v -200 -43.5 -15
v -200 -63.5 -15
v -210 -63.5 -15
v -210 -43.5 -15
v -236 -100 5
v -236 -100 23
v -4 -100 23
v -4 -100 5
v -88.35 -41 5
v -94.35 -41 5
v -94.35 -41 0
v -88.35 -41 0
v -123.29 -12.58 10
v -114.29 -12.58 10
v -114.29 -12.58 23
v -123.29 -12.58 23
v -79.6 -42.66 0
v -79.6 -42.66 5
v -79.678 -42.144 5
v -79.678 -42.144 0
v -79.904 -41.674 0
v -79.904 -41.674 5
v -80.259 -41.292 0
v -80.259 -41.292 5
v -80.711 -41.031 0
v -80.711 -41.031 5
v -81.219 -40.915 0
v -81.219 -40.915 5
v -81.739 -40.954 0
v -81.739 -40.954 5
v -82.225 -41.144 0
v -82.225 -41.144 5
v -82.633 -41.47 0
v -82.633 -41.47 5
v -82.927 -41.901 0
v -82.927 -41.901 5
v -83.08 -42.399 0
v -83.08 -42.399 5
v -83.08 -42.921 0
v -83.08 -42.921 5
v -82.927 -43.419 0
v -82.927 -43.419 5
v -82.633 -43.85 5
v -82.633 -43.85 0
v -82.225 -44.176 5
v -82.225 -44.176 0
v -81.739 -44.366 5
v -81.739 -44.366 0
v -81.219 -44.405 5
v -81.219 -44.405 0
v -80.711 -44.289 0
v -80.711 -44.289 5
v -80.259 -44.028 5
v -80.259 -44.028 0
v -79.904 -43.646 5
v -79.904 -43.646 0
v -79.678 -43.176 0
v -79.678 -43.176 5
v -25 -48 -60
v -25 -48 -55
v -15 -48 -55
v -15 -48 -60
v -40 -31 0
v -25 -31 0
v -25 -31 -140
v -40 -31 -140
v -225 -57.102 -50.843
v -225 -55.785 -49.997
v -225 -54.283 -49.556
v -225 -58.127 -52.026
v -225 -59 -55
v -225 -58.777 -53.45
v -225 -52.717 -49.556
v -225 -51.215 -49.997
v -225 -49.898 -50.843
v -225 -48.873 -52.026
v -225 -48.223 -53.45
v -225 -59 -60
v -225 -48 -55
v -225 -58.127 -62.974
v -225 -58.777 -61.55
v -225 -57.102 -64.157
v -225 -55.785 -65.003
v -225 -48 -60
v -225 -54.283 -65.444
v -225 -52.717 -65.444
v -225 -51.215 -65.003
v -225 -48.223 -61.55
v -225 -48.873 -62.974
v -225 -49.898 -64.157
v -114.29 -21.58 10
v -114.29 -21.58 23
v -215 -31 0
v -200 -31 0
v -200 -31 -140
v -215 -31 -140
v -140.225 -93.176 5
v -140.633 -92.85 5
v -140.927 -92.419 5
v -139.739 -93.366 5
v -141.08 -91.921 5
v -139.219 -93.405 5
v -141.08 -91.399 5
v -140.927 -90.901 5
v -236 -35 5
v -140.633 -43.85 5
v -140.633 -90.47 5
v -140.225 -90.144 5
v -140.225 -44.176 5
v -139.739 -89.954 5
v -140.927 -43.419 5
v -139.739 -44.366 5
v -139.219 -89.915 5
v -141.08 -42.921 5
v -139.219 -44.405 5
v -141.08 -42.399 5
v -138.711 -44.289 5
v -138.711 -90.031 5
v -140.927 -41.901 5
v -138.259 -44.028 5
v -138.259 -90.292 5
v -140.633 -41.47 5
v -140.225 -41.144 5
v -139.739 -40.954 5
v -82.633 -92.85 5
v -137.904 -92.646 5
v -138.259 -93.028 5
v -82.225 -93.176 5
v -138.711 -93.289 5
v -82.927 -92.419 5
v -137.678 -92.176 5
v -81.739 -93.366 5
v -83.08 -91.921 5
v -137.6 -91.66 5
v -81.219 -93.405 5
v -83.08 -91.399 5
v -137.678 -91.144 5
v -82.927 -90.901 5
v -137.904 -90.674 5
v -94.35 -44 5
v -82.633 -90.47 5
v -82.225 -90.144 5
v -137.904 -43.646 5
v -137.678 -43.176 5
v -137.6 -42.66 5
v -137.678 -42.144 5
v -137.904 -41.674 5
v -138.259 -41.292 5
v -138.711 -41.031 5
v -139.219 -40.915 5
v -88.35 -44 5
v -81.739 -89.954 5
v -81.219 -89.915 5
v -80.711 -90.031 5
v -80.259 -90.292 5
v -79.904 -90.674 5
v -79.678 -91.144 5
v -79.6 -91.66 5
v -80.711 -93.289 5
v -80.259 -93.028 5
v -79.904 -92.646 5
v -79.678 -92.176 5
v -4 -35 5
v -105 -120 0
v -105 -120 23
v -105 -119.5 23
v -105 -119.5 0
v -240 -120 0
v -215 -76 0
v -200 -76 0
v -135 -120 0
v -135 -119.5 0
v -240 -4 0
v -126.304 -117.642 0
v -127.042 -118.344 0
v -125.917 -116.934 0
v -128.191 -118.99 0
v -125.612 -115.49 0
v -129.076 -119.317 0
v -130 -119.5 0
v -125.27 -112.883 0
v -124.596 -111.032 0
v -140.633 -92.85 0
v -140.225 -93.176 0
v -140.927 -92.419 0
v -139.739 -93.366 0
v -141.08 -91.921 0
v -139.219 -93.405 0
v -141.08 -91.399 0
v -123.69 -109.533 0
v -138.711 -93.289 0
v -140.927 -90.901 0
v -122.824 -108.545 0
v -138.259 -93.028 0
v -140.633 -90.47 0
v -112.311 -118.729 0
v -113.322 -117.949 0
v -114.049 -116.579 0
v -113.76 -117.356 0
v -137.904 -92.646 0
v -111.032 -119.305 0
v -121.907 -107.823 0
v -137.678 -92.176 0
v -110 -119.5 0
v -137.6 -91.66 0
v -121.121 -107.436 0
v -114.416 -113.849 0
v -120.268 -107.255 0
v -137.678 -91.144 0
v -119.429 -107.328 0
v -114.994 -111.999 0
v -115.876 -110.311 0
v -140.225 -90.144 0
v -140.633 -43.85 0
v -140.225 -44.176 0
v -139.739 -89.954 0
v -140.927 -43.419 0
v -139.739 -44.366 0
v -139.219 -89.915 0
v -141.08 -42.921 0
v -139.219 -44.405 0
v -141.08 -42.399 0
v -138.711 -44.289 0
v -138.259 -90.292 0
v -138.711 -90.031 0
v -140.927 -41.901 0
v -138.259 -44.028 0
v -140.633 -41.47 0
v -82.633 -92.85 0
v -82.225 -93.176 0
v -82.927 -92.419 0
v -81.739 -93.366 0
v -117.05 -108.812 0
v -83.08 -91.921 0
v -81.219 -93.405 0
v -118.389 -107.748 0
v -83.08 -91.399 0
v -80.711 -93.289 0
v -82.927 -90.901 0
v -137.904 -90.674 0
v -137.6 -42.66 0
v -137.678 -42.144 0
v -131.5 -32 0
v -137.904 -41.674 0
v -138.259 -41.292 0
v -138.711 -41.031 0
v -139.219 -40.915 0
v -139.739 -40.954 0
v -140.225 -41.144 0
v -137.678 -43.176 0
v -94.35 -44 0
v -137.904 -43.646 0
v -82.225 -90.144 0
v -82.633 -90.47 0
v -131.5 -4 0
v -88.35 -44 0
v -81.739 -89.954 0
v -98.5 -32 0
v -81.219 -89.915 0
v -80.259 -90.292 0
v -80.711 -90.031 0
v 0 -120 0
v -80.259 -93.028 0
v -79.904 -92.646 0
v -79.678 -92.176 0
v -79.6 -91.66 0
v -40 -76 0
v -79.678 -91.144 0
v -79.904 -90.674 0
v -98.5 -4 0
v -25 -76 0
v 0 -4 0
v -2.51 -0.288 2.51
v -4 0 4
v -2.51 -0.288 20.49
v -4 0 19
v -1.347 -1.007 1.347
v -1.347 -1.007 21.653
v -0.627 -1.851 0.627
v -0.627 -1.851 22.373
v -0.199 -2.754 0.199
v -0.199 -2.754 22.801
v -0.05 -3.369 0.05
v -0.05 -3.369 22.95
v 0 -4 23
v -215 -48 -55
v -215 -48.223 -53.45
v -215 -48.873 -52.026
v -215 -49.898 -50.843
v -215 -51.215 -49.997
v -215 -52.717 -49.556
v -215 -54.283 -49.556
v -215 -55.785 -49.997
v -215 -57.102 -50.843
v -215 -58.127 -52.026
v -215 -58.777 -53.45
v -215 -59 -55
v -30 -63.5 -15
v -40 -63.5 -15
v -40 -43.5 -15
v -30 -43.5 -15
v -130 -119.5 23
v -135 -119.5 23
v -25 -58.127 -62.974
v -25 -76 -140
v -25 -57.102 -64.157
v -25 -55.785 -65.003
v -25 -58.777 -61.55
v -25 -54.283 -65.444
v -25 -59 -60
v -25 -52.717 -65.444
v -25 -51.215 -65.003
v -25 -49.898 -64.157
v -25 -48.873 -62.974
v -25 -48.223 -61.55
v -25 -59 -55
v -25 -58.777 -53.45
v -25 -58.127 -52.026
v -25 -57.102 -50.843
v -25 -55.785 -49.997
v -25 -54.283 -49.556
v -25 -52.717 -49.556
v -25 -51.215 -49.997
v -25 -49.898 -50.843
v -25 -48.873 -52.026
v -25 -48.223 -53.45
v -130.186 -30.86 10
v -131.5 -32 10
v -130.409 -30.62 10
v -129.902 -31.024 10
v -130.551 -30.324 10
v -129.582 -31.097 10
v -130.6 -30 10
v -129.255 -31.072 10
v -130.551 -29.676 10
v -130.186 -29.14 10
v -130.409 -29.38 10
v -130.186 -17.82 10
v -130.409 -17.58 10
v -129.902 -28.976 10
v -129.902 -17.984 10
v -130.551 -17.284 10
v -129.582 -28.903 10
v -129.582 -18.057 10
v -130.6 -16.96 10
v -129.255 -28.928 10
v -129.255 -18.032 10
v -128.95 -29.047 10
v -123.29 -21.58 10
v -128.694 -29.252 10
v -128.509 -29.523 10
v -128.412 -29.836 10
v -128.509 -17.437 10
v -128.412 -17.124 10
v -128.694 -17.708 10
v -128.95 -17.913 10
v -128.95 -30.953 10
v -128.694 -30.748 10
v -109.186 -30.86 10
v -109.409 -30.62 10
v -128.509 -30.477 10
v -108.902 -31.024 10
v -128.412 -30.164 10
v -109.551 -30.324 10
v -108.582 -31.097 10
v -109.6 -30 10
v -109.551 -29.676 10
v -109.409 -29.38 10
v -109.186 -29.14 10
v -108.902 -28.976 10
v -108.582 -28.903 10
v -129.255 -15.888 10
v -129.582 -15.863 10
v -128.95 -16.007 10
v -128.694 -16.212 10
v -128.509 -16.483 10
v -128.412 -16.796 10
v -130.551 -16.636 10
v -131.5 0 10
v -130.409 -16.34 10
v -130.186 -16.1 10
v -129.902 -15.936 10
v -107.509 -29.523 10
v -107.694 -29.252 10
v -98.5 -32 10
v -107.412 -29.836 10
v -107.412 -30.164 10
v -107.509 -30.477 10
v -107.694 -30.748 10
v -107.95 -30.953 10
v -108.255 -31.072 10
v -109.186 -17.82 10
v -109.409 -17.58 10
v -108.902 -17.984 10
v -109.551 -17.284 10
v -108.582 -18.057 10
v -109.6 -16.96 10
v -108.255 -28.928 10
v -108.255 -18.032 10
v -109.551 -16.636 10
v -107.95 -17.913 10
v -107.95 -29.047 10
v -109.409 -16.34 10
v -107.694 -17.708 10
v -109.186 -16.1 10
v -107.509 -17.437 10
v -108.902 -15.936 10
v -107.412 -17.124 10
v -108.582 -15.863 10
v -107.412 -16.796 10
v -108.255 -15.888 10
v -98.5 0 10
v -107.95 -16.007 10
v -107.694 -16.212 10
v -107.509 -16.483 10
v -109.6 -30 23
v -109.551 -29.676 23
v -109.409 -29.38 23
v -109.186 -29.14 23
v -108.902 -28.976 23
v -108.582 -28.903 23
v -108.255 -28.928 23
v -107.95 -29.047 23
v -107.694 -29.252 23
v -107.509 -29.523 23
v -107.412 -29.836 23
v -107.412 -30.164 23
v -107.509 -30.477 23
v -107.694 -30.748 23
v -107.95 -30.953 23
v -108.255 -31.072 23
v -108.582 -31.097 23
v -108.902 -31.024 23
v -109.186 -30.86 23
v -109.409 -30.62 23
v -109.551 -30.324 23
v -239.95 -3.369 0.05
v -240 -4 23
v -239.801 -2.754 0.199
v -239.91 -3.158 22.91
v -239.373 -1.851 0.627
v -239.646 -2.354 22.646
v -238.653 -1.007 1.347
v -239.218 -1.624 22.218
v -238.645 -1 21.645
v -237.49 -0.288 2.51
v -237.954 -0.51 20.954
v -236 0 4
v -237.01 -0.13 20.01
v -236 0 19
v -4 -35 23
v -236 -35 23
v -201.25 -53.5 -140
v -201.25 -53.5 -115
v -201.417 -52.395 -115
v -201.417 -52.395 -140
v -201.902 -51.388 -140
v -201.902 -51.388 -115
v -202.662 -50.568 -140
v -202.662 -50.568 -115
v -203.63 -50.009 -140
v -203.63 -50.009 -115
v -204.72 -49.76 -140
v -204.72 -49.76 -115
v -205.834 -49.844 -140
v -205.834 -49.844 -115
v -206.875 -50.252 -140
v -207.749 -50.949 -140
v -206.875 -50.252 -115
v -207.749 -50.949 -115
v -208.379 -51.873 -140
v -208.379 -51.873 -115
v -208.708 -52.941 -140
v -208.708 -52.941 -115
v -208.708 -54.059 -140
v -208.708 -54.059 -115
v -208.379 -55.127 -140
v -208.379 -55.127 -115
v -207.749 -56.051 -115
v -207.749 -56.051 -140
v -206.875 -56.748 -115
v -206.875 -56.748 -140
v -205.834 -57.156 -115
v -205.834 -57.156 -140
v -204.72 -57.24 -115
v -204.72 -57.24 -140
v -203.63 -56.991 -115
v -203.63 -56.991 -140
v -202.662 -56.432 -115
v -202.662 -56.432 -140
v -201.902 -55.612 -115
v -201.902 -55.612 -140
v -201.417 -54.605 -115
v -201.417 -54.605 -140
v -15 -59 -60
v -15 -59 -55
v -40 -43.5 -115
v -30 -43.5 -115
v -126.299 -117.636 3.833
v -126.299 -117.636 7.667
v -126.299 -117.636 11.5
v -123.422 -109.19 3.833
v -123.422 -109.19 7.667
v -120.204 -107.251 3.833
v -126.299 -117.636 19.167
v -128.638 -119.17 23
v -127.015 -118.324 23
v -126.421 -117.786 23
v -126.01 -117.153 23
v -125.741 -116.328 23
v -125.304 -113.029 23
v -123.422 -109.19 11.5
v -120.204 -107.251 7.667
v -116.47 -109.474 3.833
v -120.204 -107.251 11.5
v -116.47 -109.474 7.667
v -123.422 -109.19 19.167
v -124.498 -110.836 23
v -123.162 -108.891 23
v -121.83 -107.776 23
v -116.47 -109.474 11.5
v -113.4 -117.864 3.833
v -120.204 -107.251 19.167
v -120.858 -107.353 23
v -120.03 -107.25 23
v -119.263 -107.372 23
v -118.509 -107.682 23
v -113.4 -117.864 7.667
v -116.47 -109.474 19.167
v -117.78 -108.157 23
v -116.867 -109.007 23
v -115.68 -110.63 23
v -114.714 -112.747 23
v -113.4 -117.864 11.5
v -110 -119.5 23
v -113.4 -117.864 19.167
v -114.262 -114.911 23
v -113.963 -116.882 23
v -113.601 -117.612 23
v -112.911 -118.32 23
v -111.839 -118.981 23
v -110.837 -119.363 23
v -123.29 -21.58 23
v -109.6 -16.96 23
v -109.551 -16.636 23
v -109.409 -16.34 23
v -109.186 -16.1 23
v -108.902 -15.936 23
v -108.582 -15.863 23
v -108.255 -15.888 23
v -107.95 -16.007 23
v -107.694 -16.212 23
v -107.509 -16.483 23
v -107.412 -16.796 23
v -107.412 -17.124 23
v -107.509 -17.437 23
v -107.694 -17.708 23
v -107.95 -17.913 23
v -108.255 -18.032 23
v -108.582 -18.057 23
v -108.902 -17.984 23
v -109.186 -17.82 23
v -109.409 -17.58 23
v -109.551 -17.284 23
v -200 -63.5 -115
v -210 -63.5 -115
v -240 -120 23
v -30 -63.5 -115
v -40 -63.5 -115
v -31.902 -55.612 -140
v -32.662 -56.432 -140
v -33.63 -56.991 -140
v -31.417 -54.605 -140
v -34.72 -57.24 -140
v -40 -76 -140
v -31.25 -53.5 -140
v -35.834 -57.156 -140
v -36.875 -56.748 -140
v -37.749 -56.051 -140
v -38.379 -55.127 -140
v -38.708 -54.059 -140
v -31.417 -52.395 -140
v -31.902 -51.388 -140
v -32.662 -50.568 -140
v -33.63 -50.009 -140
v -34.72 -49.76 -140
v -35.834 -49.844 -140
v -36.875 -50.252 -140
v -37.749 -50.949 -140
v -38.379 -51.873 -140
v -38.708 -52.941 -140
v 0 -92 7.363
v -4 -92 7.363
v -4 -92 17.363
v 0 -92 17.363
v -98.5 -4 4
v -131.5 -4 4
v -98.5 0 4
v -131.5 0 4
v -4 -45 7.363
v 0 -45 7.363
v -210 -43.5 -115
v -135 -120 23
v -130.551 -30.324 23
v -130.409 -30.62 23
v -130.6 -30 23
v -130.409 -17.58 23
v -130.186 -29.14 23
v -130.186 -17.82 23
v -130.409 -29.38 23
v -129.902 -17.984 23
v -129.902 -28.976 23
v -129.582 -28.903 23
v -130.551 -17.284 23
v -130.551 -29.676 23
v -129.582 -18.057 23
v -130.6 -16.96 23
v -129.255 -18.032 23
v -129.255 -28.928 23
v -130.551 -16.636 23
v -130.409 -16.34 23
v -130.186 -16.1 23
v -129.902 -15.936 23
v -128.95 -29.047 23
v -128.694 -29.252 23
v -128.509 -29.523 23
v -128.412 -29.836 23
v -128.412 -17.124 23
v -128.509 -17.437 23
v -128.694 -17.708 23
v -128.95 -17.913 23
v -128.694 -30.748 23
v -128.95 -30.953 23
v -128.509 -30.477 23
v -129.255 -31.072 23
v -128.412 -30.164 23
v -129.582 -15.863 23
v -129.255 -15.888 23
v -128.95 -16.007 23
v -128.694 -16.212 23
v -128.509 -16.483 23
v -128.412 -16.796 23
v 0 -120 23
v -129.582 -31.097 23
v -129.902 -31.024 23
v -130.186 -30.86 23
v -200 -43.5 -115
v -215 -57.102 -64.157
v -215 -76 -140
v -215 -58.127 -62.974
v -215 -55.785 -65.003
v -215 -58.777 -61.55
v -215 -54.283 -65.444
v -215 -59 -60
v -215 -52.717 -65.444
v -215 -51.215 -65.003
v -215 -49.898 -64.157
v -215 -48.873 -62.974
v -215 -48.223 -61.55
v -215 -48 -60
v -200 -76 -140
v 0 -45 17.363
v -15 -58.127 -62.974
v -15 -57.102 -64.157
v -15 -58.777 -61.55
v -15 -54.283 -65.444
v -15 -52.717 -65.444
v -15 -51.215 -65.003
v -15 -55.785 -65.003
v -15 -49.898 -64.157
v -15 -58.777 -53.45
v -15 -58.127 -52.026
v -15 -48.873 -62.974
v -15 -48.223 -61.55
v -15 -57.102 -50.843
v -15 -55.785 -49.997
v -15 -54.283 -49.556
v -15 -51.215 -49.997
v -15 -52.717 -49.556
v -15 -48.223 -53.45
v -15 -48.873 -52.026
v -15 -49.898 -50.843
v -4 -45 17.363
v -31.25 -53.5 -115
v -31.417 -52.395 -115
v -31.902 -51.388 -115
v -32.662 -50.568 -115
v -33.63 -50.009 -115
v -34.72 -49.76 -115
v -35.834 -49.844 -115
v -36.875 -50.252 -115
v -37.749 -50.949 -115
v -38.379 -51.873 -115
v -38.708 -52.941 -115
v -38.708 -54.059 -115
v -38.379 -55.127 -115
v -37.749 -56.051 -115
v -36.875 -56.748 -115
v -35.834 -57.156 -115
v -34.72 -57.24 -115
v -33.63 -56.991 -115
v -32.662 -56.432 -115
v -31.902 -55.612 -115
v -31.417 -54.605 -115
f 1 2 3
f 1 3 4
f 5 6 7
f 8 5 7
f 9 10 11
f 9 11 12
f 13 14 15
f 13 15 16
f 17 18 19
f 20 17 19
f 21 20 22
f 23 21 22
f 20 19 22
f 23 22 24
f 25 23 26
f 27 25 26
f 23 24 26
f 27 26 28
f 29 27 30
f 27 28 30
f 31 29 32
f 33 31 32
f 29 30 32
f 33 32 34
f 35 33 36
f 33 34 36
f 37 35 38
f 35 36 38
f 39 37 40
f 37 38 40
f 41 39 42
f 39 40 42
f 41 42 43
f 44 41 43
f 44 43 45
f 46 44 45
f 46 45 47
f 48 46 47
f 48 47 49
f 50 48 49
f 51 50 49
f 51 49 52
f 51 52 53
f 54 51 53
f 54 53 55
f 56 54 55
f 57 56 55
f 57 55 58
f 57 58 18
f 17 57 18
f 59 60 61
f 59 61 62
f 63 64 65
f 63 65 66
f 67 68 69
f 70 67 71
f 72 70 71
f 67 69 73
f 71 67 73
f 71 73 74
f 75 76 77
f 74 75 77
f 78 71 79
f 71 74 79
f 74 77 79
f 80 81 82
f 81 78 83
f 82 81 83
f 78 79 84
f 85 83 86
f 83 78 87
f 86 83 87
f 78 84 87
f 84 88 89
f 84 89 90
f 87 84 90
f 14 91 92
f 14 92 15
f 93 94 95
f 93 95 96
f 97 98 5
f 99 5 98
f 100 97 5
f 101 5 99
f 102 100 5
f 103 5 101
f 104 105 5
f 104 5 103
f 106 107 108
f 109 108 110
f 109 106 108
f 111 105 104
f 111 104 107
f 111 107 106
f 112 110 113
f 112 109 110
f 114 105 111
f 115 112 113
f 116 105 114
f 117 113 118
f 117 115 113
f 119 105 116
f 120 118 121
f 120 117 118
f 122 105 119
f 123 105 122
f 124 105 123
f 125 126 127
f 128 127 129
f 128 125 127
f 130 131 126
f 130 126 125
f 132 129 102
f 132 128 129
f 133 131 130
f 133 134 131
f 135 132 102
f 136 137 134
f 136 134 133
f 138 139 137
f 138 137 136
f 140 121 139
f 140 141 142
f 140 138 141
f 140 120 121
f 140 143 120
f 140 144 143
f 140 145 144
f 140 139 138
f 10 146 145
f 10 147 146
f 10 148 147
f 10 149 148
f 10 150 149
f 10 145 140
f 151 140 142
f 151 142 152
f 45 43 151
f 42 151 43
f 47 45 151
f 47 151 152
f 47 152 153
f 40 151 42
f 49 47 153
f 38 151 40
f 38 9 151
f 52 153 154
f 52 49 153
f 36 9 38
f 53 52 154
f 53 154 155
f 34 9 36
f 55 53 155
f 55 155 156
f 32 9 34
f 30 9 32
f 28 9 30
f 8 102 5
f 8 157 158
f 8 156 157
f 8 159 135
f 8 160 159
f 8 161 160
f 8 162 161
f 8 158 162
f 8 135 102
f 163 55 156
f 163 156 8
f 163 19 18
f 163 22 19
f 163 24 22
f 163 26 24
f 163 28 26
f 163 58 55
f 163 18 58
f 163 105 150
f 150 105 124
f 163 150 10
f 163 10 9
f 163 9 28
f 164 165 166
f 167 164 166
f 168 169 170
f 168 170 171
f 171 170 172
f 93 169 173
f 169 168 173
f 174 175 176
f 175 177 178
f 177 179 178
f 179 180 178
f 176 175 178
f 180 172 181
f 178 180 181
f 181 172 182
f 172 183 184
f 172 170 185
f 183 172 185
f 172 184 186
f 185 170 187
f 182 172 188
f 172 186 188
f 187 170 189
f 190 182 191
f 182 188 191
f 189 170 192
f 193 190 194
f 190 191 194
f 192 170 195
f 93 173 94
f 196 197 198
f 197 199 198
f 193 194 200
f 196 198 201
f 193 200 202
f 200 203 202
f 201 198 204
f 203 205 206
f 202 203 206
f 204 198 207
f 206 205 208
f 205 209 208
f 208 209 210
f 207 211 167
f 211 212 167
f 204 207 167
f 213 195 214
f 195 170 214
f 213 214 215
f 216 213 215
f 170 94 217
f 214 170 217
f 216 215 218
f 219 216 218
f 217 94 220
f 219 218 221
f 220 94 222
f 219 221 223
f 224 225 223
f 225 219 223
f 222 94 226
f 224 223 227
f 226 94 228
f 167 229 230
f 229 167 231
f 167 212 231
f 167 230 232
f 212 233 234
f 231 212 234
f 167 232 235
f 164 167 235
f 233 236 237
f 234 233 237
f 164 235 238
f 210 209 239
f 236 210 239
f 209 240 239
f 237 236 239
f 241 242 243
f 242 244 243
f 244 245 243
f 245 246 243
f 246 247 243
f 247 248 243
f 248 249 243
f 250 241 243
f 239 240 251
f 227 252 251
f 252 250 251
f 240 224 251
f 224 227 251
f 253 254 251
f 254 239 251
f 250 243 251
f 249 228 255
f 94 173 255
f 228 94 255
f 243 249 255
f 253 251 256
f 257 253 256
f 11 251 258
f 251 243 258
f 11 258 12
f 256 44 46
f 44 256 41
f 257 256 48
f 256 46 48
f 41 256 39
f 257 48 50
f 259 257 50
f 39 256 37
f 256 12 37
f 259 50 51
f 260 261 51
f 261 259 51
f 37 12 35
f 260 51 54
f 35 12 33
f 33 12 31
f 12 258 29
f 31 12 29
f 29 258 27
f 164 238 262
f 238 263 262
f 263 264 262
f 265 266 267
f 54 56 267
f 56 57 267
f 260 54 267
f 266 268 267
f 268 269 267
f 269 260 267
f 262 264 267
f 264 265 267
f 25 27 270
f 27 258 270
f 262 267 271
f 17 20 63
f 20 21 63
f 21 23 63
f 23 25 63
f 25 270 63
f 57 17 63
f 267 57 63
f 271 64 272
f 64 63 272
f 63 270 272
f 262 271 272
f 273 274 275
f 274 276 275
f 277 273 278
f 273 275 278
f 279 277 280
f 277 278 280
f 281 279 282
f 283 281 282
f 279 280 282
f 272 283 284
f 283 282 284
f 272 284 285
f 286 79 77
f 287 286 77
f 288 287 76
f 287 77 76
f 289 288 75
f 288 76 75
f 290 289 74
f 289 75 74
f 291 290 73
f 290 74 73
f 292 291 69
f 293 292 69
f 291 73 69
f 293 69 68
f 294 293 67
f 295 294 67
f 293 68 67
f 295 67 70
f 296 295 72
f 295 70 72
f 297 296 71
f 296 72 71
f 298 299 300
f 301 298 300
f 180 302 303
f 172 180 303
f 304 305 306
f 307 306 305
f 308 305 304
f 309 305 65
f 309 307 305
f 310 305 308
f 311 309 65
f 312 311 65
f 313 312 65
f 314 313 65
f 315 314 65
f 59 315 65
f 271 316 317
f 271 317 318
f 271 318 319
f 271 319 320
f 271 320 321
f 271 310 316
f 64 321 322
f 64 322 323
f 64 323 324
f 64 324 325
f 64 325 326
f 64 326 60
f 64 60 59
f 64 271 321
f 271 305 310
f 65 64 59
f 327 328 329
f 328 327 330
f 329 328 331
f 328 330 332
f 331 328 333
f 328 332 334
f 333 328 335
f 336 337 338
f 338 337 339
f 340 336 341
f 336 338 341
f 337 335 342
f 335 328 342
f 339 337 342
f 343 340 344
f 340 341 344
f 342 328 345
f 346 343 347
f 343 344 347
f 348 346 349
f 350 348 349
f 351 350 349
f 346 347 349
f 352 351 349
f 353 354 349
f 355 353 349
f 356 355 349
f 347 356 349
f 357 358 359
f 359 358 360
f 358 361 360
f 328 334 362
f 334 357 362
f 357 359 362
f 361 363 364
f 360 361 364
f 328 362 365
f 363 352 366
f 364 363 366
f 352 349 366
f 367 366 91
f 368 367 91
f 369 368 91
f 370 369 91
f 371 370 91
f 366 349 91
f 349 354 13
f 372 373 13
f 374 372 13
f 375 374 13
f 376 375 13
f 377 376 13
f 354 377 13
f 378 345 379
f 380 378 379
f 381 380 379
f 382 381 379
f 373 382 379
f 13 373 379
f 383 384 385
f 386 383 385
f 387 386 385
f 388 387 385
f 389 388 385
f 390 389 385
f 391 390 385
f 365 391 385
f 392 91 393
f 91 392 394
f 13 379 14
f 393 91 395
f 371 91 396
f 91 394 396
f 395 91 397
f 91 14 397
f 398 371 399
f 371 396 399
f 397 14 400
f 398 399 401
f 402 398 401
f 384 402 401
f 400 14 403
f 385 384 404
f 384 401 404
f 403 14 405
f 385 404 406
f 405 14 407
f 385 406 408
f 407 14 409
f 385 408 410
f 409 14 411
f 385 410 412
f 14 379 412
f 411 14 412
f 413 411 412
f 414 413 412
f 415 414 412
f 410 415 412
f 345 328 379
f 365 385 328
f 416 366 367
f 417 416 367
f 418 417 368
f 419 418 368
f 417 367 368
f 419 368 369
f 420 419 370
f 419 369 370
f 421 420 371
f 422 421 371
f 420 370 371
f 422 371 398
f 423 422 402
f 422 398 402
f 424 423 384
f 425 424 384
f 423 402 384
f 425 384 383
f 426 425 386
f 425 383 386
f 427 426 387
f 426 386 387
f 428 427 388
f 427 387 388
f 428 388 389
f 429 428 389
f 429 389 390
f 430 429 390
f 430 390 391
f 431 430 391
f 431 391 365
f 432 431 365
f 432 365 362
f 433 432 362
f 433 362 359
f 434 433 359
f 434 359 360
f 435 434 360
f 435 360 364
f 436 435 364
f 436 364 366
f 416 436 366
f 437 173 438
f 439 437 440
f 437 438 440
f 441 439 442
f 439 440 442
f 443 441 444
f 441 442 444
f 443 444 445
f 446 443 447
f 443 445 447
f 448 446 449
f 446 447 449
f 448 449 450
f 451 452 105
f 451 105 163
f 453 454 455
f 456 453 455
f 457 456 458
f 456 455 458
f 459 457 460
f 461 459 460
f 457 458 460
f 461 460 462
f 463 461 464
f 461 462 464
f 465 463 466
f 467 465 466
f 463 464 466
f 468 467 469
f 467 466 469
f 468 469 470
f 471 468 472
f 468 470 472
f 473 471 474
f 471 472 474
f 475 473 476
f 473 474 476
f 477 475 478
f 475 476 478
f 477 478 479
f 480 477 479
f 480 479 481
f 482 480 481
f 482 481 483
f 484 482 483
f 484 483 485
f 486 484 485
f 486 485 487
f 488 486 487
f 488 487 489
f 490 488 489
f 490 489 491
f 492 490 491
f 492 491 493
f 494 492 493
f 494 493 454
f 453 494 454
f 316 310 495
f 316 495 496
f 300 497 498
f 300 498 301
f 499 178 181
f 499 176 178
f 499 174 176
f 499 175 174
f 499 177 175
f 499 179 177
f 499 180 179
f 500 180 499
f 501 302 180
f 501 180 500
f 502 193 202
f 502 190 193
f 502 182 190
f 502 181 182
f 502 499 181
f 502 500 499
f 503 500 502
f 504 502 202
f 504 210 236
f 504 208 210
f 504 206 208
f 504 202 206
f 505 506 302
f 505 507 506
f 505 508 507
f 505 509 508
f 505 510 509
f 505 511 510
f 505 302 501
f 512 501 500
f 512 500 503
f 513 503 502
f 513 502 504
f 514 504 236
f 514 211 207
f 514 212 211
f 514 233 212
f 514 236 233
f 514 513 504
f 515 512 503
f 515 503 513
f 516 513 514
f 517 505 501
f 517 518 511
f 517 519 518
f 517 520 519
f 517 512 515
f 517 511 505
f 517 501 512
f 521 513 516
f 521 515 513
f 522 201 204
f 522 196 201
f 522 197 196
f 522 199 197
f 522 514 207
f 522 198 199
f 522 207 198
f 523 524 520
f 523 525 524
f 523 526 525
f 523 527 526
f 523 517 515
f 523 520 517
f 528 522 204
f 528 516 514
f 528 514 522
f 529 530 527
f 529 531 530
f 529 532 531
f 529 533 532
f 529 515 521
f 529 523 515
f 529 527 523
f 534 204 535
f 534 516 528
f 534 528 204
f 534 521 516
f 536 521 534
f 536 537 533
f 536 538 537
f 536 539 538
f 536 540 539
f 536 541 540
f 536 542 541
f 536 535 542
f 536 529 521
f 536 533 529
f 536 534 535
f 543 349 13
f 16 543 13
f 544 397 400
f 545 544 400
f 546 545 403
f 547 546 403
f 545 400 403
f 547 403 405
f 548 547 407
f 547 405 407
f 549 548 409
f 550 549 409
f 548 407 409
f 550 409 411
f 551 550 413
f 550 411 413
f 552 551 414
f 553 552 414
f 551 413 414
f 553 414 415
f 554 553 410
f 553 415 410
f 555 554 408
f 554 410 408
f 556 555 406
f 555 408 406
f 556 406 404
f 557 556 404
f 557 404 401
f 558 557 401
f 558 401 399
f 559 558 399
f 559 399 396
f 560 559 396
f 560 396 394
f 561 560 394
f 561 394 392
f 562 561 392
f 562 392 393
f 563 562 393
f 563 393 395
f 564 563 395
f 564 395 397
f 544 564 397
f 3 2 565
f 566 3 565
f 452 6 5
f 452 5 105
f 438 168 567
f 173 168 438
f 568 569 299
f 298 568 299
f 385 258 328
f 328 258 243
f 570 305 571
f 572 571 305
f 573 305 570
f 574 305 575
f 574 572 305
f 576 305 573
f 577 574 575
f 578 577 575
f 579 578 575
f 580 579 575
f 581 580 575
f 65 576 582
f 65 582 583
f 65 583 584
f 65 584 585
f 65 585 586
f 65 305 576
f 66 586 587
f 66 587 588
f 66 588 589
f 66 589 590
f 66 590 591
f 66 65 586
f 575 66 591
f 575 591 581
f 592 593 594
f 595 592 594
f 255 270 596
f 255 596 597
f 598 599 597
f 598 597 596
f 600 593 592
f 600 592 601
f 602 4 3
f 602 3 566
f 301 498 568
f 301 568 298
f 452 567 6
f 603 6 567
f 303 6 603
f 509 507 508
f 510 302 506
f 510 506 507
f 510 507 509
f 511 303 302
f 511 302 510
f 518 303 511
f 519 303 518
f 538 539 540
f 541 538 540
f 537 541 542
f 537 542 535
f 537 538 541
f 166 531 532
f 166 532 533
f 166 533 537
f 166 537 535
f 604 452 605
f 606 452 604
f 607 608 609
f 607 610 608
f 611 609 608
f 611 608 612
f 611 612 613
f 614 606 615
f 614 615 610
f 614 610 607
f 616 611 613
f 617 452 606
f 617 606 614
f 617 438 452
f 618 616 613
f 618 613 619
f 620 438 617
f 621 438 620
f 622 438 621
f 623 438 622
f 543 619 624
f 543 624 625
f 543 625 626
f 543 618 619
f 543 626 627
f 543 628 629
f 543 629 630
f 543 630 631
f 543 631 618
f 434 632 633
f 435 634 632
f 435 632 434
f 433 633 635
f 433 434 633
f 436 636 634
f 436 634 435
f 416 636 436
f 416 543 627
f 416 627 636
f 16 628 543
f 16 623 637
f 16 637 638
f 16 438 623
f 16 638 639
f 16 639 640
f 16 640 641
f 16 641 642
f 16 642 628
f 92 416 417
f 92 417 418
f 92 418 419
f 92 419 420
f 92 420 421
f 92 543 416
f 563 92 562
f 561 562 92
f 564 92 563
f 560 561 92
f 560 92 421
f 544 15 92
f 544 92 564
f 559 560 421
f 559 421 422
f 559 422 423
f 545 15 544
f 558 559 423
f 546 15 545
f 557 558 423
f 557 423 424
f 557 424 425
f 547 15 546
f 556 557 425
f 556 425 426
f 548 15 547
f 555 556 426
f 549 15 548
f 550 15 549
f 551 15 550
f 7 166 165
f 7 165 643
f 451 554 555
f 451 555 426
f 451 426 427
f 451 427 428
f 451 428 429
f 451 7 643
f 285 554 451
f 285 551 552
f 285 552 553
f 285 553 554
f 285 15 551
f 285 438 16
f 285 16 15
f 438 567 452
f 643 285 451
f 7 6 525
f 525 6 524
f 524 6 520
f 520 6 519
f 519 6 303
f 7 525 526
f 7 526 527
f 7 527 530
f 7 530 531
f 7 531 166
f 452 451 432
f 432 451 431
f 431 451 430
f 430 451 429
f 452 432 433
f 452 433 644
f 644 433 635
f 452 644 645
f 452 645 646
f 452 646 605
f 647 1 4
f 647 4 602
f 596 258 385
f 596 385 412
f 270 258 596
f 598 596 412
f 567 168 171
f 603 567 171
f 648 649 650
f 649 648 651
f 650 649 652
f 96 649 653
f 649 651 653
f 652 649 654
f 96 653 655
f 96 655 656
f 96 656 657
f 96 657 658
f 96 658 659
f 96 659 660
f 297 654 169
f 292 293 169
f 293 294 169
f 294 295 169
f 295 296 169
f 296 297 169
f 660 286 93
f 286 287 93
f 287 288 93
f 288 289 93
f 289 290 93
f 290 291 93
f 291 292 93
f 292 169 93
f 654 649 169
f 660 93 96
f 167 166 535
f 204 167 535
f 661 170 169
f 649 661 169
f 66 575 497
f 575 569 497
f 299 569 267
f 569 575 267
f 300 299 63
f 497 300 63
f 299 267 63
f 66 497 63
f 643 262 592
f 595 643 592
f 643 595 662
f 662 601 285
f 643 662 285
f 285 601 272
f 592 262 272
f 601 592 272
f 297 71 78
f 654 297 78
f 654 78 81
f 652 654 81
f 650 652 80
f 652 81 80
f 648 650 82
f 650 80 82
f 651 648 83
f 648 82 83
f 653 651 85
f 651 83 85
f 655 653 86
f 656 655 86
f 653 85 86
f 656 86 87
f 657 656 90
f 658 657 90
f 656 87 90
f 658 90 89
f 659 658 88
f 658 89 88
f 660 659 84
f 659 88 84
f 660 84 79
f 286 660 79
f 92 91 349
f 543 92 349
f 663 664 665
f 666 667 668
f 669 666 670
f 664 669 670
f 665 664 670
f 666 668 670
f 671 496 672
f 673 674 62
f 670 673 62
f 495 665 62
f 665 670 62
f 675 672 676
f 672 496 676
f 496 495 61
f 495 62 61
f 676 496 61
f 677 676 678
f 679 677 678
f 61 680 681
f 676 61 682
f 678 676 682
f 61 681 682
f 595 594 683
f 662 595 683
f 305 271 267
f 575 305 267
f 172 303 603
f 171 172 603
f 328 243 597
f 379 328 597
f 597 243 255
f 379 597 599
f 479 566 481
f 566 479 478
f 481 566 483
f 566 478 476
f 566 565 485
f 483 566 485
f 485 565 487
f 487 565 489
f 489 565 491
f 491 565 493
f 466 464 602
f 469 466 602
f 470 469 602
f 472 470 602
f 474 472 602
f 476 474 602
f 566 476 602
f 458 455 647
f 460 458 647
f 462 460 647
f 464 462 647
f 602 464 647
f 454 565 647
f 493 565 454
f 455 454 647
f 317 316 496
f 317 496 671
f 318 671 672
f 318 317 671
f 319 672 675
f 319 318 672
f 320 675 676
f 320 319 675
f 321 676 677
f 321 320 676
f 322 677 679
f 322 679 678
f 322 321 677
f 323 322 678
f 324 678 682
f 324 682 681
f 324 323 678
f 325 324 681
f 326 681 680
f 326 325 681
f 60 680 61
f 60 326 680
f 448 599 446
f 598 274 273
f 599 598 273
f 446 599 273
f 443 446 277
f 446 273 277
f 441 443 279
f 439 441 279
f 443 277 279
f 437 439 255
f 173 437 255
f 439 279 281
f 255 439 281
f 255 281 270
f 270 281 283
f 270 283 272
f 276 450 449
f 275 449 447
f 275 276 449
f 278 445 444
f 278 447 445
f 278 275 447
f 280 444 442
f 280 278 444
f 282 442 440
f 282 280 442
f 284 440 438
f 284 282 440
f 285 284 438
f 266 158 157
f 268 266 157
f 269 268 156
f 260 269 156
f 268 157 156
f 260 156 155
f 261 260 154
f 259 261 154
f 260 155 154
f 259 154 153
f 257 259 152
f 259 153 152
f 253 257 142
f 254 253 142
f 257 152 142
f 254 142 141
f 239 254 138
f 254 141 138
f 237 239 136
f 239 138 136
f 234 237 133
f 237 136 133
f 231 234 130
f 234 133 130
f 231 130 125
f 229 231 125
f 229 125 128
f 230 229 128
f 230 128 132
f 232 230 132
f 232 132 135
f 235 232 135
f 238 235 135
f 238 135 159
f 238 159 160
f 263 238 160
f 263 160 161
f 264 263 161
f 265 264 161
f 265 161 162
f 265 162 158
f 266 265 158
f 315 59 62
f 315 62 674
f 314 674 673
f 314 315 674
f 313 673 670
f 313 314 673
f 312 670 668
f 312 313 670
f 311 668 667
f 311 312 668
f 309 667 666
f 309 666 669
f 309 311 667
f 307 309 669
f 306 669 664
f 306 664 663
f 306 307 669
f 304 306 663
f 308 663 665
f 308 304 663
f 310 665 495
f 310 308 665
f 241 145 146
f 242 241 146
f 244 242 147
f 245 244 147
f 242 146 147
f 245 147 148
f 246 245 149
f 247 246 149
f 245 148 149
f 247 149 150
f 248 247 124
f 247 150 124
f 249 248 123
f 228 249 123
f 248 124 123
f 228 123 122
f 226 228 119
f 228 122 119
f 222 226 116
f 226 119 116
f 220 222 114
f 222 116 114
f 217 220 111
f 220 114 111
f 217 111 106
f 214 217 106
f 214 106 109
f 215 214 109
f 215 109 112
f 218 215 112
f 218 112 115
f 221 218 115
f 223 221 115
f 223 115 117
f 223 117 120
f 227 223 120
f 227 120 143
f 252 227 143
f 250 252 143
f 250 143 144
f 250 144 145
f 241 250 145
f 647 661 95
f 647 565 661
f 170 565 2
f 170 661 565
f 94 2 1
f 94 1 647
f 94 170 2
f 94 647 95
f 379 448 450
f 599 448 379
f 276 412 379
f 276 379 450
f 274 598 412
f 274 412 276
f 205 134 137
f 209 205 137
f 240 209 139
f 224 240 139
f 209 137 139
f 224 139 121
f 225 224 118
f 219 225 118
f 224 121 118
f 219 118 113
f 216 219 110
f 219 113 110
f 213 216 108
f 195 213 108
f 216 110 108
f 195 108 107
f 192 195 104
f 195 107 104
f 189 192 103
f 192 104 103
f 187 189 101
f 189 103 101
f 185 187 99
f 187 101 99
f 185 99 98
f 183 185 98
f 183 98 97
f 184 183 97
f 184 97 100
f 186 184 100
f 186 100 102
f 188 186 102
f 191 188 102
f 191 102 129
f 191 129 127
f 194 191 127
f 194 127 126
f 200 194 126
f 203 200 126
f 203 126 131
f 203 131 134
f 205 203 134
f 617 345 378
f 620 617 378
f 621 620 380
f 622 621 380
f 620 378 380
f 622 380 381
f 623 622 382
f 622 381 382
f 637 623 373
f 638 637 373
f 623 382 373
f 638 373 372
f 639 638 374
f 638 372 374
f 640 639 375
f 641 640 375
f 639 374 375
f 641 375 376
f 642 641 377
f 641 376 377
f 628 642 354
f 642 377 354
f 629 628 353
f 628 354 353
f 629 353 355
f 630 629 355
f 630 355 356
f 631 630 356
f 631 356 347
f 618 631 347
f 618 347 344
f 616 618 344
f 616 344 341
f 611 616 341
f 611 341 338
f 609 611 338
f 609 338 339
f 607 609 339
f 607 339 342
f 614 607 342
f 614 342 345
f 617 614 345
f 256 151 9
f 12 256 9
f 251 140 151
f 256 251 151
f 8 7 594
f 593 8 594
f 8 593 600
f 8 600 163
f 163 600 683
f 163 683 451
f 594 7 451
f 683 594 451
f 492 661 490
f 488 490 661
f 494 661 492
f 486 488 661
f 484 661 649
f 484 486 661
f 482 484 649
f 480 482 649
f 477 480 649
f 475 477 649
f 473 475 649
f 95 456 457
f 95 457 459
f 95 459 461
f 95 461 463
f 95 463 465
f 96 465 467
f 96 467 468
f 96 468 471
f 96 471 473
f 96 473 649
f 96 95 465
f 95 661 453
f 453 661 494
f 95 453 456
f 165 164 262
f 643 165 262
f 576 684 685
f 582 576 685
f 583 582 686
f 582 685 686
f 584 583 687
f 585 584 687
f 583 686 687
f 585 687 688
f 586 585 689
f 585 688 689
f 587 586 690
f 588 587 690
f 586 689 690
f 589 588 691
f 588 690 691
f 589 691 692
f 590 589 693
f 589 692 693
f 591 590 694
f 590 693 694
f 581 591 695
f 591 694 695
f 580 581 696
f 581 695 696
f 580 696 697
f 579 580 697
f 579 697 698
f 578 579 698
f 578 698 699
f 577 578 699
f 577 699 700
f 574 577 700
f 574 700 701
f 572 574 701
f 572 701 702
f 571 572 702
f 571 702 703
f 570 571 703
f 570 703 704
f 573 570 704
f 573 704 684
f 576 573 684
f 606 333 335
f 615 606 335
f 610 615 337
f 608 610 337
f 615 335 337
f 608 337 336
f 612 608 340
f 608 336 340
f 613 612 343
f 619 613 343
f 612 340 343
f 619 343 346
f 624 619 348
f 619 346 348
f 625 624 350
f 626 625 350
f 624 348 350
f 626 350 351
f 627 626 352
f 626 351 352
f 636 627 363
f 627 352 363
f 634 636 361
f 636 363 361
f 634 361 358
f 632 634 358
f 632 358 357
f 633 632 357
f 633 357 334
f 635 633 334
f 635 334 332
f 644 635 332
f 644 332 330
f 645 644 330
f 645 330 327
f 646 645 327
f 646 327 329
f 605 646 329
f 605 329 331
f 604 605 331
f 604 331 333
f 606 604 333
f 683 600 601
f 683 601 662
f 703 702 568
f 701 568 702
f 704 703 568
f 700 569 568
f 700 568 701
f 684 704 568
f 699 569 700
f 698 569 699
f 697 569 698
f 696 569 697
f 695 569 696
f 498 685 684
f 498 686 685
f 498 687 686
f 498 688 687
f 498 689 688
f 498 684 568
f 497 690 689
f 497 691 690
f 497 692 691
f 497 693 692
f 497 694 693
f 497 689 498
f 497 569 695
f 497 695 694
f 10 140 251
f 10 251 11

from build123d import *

# Parameters (mm, degrees)
ESQUISSE1_W              = 240
ESQUISSE1_H              = 120
BOSS_EXTRU_1_DEPTH       = 23
ESQUISSE2_W              = 232
ESQUISSE2_H              = 65
ENL_V_MAT_EXTRU_1_DEPTH  = 18
CONG_1_R                 = 4
ESQUISSE7_R              = 1.75
ENL_V_MAT_EXTRU_3_DEPTH  = 10
ESQUISSE14_W             = 10
ESQUISSE14_H             = 47
ENL_V_MAT_EXTRU_9_DEPTH  = 43
ESQUISSE17_W             = 33
ESQUISSE17_H             = 6
ENL_V_MAT_EXTRU_11_DEPTH = 32
ESQUISSE18_W             = 33
ESQUISSE18_H             = 28
ENL_V_MAT_EXTRU_12_DEPTH = 7
ESQUISSE19_W             = 15
ESQUISSE19_H             = 45
BOSS_EXTRU_2_DEPTH       = 140
ESQUISSE20_W             = 100
ESQUISSE20_H             = 20
ENL_V_MAT_EXTRU_13_DEPTH = 10
ESQUISSE21_R             = 3.75
ENL_V_MAT_EXTRU_14_DEPTH = 40
ESQUISSE22_W             = 100
ESQUISSE22_H             = 20
ENL_V_MAT_EXTRU_15_DEPTH = 10
ESQUISSE23_R             = 3.75
ENL_V_MAT_EXTRU_16_DEPTH = 40
BOSS_EXTRU_3_DEPTH       = 10
BOSS_EXTRU_4_START       = 10
BOSS_EXTRU_4_DEPTH       = 10
ESQUISSE30_R             = 1.1
ESQUISSE30_W             = 9
ESQUISSE30_H             = 9
ENL_V_MAT_EXTRU_22_DEPTH = 30
ESQUISSE31_W             = 6
ESQUISSE31_H             = 3
ENL_V_MAT_EXTRU_23_DEPTH = 10
ENL_V_MAT_EXTRU_24_DEPTH = 40


with BuildPart() as part:
    # Esquisse1 → Boss.-Extru.1 (new body)
    with BuildSketch(Plane.XY):
        with Locations((-120, -60)):
            Rectangle(ESQUISSE1_W, ESQUISSE1_H)
    extrude(amount=BOSS_EXTRU_1_DEPTH)

    # Esquisse2 → Enlèv. mat.-Extru.1 (cut)
    with BuildSketch(Plane.XY.offset(23)):
        with Locations((-120, -67.5)):
            Rectangle(ESQUISSE2_W, ESQUISSE2_H)
    extrude(amount=-ENL_V_MAT_EXTRU_1_DEPTH, mode=Mode.SUBTRACT)

    # Congé1
    cong_1_edges = [part.edges().sort_by_distance(p)[0] for p in [
        (-120, 0, 0),
        (-240, 0, 11.5),
        (0, 0, 11.5),
        (-120, 0, 23),
    ]]
    fillet(cong_1_edges, radius=CONG_1_R)

    # Esquisse7 → Enlèv. mat.-Extru.3 (cut)
    with BuildSketch(Plane.XY.offset(5)):
        with Locations((-139.35, -42.66)):
            Circle(ESQUISSE7_R)
        with Locations((-139.35, -91.66)):
            Circle(ESQUISSE7_R)
        with Locations((-81.35, -91.66)):
            Circle(ESQUISSE7_R)
        with Locations((-81.35, -42.66)):
            Circle(ESQUISSE7_R)
    extrude(amount=-ENL_V_MAT_EXTRU_3_DEPTH, mode=Mode.SUBTRACT)

    # Esquisse14 → Enlèv. mat.-Extru.9 (cut)
    with BuildSketch(Plane.ZY.offset(4)):
        with Locations((12.363440201, -68.5)):
            Rectangle(ESQUISSE14_W, ESQUISSE14_H)
    extrude(amount=-ENL_V_MAT_EXTRU_9_DEPTH, mode=Mode.SUBTRACT)

    # Esquisse17 → Enlèv. mat.-Extru.11 (cut)
    with BuildSketch(Plane(origin=(0, 0, 0), x_dir=(1, 0, 0), z_dir=(0, 1, 0))):
        with Locations((-115, -7)):
            Rectangle(ESQUISSE17_W, ESQUISSE17_H)
    extrude(amount=-ENL_V_MAT_EXTRU_11_DEPTH, mode=Mode.SUBTRACT)

    # Esquisse18 → Enlèv. mat.-Extru.12 (cut)
    with BuildSketch(Plane(origin=(0, 0, 0), x_dir=(-1, 0, 0), z_dir=(0, 0, -1))):
        with Locations((115, -18)):
            Rectangle(ESQUISSE18_W, ESQUISSE18_H)
    extrude(amount=-ENL_V_MAT_EXTRU_12_DEPTH, mode=Mode.SUBTRACT)

    # Esquisse19 → Boss.-Extru.2 (add)
    with BuildSketch(Plane(origin=(0, 0, 0), x_dir=(-1, 0, 0), z_dir=(0, 0, -1))):
        with Locations((32.5, -53.5)):
            Rectangle(ESQUISSE19_W, ESQUISSE19_H)
        with Locations((207.5, -53.5)):
            Rectangle(ESQUISSE19_W, ESQUISSE19_H)
    extrude(amount=BOSS_EXTRU_2_DEPTH)

    # Esquisse20 → Enlèv. mat.-Extru.13 (cut)
    with BuildSketch(Plane.ZY.offset(40)):
        with Locations((-65, -53.5)):
            Rectangle(ESQUISSE20_W, ESQUISSE20_H)
    extrude(amount=-ENL_V_MAT_EXTRU_13_DEPTH, mode=Mode.SUBTRACT)

    # Esquisse21 → Enlèv. mat.-Extru.14 (cut)
    with BuildSketch(Plane.XY.offset(-115)):
        with Locations((-35, -53.5)):
            Circle(ESQUISSE21_R)
    extrude(amount=-ENL_V_MAT_EXTRU_14_DEPTH, mode=Mode.SUBTRACT)

    # Esquisse22 → Enlèv. mat.-Extru.15 (cut)
    with BuildSketch(Plane(origin=(-200, 0, 0), x_dir=(0, 0, -1), z_dir=(1, 0, 0))):
        with Locations((65, -53.5)):
            Rectangle(ESQUISSE22_W, ESQUISSE22_H)
    extrude(amount=-ENL_V_MAT_EXTRU_15_DEPTH, mode=Mode.SUBTRACT)

    # Esquisse23 → Enlèv. mat.-Extru.16 (cut)
    with BuildSketch(Plane.XY.offset(-115)):
        with Locations((-205, -53.5)):
            Circle(ESQUISSE23_R)
    extrude(amount=-ENL_V_MAT_EXTRU_16_DEPTH, mode=Mode.SUBTRACT)

    # Esquisse25 → Boss.-Extru.3 (add)
    with BuildSketch(Plane(origin=(-25, 0, 0), x_dir=(0, 0, -1), z_dir=(1, 0, 0))):
        with BuildLine():
            Line((55, -48), (60, -48))
            ThreePointArc((60, -48), (65.5, -53.5), (60, -59))
            Line((60, -59), (55, -59))
            ThreePointArc((55, -59), (49.5, -53.5), (55, -48))
        make_face()
    extrude(amount=BOSS_EXTRU_3_DEPTH)

    # Esquisse26 → Boss.-Extru.4 (add)
    with BuildSketch(Plane.ZY.offset(215).offset(BOSS_EXTRU_4_START)):
        with BuildLine():
            Line((-60, -48), (-55, -48))
            ThreePointArc((-55, -48), (-49.5, -53.5), (-55, -59))
            Line((-55, -59), (-60, -59))
            ThreePointArc((-60, -59), (-65.5, -53.5), (-60, -48))
        make_face()
    extrude(amount=-BOSS_EXTRU_4_DEPTH)

    # Esquisse30 → Enlèv. mat.-Extru.22 (cut)
    with BuildSketch(Plane(origin=(0, 0, 10), x_dir=(-1, 0, 0), z_dir=(0, 0, -1))):
        with Locations((108.5, -30)):
            Circle(ESQUISSE30_R)
        with Locations((129.5, -30)):
            Circle(ESQUISSE30_R)
        with Locations((129.5, -16.96)):
            Circle(ESQUISSE30_R)
        with Locations((108.5, -16.96)):
            Circle(ESQUISSE30_R)
        with Locations((118.79, -17.08)):
            Rectangle(ESQUISSE30_W, ESQUISSE30_H)
    extrude(amount=-ENL_V_MAT_EXTRU_22_DEPTH, mode=Mode.SUBTRACT)

    # Esquisse31 → Enlèv. mat.-Extru.23 (cut)
    with BuildSketch(Plane.XY.offset(5)):
        with Locations((-91.35, -42.5)):
            Rectangle(ESQUISSE31_W, ESQUISSE31_H)
    extrude(amount=-ENL_V_MAT_EXTRU_23_DEPTH, mode=Mode.SUBTRACT)

    # Esquisse32 → Enlèv. mat.-Extru.24 (cut)
    with BuildSketch(Plane.XY.offset(23)):
        with BuildLine():
            Line((-135, -119.5), (-135, -120))
            Line((-135, -120), (-105, -120))
            Line((-105, -120), (-105, -119.5))
            Line((-105, -119.5), (-110, -119.5))
            add(Edge.make_bspline(
                [(-130, -119.5), (-129.411520636, -119.5), (-125.206007881, -118.2698291), (-126.070515277, -112.049296748), (-119.869966777, -103.868703164), (-113.838690693, -112.386692695), (-114.398901471, -118.075641111), (-110.922134696, -119.5), (-110, -119.5)],
                knots=[0, 0, 0, 0, 0.144122834, 0.276784549, 0.509496521, 0.778688307, 0.880905797, 1, 1, 1, 1], degree=3))
            Line((-130, -119.5), (-135, -119.5))
        make_face()
    extrude(amount=-ENL_V_MAT_EXTRU_24_DEPTH, mode=Mode.SUBTRACT)


solid = part.part
